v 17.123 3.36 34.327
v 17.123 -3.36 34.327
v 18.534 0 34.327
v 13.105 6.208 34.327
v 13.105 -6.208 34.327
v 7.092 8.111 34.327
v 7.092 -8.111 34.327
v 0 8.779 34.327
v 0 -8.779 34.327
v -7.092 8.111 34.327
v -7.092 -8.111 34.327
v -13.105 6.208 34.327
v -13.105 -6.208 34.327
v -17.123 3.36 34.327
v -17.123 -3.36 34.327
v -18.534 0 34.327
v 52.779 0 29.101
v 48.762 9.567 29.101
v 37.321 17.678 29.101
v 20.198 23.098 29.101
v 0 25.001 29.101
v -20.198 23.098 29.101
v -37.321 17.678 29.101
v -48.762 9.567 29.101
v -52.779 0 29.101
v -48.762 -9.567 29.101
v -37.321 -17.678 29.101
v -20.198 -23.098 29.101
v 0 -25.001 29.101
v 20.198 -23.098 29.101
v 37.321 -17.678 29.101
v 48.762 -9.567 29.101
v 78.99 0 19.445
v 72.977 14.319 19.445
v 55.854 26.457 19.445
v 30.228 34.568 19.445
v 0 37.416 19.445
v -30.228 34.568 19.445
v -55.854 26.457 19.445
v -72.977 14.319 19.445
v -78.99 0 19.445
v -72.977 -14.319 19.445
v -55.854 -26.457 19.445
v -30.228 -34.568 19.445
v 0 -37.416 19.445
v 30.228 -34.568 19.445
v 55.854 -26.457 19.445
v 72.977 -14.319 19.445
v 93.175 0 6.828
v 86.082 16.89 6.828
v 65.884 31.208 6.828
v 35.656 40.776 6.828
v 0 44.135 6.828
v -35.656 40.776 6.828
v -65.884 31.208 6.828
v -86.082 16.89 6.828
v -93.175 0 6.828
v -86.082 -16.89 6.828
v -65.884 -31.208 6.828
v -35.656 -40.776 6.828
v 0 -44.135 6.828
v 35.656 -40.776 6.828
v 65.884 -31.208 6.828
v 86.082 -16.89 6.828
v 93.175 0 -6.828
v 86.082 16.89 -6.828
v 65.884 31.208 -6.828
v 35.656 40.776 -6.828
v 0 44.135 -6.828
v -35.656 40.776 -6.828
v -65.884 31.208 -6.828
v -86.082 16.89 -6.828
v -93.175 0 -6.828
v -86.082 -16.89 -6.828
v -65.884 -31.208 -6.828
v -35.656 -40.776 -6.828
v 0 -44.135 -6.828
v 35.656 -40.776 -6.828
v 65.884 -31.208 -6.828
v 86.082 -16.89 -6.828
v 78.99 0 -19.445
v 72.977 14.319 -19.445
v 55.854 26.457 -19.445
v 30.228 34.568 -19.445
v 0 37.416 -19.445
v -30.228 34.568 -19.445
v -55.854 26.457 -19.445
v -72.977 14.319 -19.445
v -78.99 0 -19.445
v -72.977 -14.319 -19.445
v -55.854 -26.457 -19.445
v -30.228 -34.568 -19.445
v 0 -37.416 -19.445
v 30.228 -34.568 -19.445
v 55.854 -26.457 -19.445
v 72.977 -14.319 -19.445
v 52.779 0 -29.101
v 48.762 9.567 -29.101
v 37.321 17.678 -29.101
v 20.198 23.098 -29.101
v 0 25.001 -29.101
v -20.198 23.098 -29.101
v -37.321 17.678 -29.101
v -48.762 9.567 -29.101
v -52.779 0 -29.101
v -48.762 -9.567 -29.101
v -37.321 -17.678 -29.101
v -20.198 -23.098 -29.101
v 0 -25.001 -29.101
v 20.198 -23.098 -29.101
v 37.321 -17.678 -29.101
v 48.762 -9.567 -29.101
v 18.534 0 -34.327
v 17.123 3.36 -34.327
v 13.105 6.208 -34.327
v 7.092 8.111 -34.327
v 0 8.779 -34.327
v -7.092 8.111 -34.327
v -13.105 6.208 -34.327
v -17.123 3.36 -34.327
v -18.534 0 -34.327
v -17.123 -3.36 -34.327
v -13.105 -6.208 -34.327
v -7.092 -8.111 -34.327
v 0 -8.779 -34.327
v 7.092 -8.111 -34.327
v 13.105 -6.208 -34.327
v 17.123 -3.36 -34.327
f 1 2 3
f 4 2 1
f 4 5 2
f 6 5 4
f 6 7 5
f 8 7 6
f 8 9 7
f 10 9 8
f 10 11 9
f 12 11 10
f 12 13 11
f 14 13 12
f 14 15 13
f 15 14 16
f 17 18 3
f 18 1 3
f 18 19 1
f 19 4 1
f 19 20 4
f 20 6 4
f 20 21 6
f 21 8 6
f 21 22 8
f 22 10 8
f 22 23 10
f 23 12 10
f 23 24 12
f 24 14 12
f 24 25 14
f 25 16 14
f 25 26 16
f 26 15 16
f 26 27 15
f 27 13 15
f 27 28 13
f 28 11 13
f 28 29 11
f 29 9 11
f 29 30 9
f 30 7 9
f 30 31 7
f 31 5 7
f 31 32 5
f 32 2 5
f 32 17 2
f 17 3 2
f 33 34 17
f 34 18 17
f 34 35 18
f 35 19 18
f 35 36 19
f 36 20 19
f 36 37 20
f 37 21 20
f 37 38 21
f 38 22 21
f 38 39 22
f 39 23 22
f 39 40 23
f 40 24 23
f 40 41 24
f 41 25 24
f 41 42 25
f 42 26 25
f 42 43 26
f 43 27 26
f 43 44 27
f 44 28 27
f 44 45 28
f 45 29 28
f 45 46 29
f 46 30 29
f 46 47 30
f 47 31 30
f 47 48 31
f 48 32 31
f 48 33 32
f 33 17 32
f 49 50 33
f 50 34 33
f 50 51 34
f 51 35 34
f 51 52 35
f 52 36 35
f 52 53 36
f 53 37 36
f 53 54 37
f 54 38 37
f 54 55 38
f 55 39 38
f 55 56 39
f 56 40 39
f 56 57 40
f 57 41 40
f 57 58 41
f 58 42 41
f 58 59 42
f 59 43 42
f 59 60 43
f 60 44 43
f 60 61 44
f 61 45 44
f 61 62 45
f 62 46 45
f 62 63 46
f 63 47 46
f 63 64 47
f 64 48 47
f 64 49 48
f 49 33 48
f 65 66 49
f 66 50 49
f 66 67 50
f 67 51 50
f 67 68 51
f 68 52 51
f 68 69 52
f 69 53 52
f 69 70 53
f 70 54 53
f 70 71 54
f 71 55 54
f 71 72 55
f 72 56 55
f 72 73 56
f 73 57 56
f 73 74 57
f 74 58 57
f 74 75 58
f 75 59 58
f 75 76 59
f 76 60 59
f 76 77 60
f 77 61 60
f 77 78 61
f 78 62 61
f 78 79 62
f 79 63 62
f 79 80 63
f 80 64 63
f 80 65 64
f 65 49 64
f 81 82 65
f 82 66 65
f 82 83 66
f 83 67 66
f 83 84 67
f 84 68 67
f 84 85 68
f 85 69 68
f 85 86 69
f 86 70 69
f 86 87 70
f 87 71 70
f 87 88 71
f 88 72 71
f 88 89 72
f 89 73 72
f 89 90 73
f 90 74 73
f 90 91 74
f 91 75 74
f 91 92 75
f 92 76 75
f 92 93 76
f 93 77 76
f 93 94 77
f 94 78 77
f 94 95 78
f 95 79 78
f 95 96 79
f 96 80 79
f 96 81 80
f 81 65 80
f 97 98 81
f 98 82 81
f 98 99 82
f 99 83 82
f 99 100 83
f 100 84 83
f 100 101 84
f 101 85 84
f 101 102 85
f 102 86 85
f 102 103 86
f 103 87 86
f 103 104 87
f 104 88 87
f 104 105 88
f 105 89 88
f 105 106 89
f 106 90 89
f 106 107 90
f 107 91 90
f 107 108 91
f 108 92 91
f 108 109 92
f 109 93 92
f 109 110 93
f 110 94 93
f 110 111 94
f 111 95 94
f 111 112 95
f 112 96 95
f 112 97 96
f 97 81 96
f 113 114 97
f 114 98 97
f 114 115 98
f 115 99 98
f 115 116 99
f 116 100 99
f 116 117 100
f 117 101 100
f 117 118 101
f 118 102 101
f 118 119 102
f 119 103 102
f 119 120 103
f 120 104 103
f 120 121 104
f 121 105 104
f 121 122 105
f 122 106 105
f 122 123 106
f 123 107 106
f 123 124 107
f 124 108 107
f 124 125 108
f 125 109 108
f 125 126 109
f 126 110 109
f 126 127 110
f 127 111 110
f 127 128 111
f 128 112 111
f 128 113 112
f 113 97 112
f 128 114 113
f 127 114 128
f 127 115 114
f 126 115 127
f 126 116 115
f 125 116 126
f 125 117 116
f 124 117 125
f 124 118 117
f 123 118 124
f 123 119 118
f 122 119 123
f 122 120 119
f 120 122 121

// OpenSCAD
// Generated by SolidPython 1.0.1 on 2020-07-29 00:46:53


scale(v = [19, 9, 7]) {
	sphere(r = 5);
}
/***********************************************
*********      SolidPython code:      **********
************************************************
 
# import packages: SolidPython
from solid import *
from solid.utils import *
from itertools import chain, combinations, permutations


class Resize:

    def __init__(self, scad_file):
        self.scad_file = scad_file
        #self.scad_file = import_scad(scad_file)
        # cone/cylinder param:
        self.r1 = 0
        self.r2 = 0
        self.h = 0
        # rectangular prism param:
        self.w = 0
        self.l = 0
        # ellipse param:
        self.r = 0

    # import OpenScad code (file name corresponds to shape)


    # classify shape + parameters
    def assign(self, param1, param2, param3):
        if self.scad_file == 'cone.scad':
            self.r1 = param1
            self.r2 = param2
            self.h = param3
        elif self.scad_file == 'cylinder.scad':
            self.r1 = param1
            self.r2 = param2
            self.h = param3
        elif self.scad_file == 'rectangularPrism.scad':
            self.h = param1
            self.l = param2
            self.w = param3
        else:
            self.r = param1
            self.h = param2

    # resize parameters
    def iterate(self):
        x = range(3, 20, 2)
        i = 1
        if self.scad_file == 'cone.scad':
            tempList = list(permutations(x, 2))
            for temp in tempList:
                param1 = temp[0]
                param2 = temp[1]
                filepath = 'produced_scad_files/' + 'cone' + str(param1) + '_' + str(param2) + '_' + '.scad'
                scad_render_to_file(cylinder(h=param1, r1=param2, r2=0), filepath)

        elif self.scad_file == 'cylinder.scad':
            tempList = list(permutations(x, 3))
            for temp in tempList:
                param1 = temp[0]
                param2 = temp[1]
                filepath = 'produced_scad_files/' + 'cylinder' + str(param1) + '_' + str(param2) + '_' + '.scad'
                scad_render_to_file(cylinder(h=param1, r1=param2, r2=param2), filepath)

        elif self.scad_file == 'rectangularPrism.scad':
            tempList = list(permutations(x, 3))
            for temp in tempList:
                param1 = temp[0]
                param2 = temp[1]
                param3 = temp[2]
                filepath = 'produced_scad_files/' + 'rectangularPrism' + str(param1) + '_' + str(param2) + '_' + str(
                    param3) + '.scad'
                scad_render_to_file(cube(size=(param1, param2, param3)), filepath)

        elif self.scad_file == 'ellipse.scad':
            tempList = list(permutations(x, 4))
            for temp in tempList:
                param1 = temp[0]
                param2 = temp[1]
                param3 = temp[2]
                param4 = temp[3]
                filepath = 'produced_scad_files/' + 'ellipse' + str(param1) + '_' + str(param2) + '_' + str(param3) + '_' + str(param4) + '.scad'
                scad_render_to_file(scale([param1, param2, param3])(sphere(r=param4)), filepath)

    def render_to_scadfile(self):
        scad_render_to_file(scad, 'example.scad') 
 
************************************************/
